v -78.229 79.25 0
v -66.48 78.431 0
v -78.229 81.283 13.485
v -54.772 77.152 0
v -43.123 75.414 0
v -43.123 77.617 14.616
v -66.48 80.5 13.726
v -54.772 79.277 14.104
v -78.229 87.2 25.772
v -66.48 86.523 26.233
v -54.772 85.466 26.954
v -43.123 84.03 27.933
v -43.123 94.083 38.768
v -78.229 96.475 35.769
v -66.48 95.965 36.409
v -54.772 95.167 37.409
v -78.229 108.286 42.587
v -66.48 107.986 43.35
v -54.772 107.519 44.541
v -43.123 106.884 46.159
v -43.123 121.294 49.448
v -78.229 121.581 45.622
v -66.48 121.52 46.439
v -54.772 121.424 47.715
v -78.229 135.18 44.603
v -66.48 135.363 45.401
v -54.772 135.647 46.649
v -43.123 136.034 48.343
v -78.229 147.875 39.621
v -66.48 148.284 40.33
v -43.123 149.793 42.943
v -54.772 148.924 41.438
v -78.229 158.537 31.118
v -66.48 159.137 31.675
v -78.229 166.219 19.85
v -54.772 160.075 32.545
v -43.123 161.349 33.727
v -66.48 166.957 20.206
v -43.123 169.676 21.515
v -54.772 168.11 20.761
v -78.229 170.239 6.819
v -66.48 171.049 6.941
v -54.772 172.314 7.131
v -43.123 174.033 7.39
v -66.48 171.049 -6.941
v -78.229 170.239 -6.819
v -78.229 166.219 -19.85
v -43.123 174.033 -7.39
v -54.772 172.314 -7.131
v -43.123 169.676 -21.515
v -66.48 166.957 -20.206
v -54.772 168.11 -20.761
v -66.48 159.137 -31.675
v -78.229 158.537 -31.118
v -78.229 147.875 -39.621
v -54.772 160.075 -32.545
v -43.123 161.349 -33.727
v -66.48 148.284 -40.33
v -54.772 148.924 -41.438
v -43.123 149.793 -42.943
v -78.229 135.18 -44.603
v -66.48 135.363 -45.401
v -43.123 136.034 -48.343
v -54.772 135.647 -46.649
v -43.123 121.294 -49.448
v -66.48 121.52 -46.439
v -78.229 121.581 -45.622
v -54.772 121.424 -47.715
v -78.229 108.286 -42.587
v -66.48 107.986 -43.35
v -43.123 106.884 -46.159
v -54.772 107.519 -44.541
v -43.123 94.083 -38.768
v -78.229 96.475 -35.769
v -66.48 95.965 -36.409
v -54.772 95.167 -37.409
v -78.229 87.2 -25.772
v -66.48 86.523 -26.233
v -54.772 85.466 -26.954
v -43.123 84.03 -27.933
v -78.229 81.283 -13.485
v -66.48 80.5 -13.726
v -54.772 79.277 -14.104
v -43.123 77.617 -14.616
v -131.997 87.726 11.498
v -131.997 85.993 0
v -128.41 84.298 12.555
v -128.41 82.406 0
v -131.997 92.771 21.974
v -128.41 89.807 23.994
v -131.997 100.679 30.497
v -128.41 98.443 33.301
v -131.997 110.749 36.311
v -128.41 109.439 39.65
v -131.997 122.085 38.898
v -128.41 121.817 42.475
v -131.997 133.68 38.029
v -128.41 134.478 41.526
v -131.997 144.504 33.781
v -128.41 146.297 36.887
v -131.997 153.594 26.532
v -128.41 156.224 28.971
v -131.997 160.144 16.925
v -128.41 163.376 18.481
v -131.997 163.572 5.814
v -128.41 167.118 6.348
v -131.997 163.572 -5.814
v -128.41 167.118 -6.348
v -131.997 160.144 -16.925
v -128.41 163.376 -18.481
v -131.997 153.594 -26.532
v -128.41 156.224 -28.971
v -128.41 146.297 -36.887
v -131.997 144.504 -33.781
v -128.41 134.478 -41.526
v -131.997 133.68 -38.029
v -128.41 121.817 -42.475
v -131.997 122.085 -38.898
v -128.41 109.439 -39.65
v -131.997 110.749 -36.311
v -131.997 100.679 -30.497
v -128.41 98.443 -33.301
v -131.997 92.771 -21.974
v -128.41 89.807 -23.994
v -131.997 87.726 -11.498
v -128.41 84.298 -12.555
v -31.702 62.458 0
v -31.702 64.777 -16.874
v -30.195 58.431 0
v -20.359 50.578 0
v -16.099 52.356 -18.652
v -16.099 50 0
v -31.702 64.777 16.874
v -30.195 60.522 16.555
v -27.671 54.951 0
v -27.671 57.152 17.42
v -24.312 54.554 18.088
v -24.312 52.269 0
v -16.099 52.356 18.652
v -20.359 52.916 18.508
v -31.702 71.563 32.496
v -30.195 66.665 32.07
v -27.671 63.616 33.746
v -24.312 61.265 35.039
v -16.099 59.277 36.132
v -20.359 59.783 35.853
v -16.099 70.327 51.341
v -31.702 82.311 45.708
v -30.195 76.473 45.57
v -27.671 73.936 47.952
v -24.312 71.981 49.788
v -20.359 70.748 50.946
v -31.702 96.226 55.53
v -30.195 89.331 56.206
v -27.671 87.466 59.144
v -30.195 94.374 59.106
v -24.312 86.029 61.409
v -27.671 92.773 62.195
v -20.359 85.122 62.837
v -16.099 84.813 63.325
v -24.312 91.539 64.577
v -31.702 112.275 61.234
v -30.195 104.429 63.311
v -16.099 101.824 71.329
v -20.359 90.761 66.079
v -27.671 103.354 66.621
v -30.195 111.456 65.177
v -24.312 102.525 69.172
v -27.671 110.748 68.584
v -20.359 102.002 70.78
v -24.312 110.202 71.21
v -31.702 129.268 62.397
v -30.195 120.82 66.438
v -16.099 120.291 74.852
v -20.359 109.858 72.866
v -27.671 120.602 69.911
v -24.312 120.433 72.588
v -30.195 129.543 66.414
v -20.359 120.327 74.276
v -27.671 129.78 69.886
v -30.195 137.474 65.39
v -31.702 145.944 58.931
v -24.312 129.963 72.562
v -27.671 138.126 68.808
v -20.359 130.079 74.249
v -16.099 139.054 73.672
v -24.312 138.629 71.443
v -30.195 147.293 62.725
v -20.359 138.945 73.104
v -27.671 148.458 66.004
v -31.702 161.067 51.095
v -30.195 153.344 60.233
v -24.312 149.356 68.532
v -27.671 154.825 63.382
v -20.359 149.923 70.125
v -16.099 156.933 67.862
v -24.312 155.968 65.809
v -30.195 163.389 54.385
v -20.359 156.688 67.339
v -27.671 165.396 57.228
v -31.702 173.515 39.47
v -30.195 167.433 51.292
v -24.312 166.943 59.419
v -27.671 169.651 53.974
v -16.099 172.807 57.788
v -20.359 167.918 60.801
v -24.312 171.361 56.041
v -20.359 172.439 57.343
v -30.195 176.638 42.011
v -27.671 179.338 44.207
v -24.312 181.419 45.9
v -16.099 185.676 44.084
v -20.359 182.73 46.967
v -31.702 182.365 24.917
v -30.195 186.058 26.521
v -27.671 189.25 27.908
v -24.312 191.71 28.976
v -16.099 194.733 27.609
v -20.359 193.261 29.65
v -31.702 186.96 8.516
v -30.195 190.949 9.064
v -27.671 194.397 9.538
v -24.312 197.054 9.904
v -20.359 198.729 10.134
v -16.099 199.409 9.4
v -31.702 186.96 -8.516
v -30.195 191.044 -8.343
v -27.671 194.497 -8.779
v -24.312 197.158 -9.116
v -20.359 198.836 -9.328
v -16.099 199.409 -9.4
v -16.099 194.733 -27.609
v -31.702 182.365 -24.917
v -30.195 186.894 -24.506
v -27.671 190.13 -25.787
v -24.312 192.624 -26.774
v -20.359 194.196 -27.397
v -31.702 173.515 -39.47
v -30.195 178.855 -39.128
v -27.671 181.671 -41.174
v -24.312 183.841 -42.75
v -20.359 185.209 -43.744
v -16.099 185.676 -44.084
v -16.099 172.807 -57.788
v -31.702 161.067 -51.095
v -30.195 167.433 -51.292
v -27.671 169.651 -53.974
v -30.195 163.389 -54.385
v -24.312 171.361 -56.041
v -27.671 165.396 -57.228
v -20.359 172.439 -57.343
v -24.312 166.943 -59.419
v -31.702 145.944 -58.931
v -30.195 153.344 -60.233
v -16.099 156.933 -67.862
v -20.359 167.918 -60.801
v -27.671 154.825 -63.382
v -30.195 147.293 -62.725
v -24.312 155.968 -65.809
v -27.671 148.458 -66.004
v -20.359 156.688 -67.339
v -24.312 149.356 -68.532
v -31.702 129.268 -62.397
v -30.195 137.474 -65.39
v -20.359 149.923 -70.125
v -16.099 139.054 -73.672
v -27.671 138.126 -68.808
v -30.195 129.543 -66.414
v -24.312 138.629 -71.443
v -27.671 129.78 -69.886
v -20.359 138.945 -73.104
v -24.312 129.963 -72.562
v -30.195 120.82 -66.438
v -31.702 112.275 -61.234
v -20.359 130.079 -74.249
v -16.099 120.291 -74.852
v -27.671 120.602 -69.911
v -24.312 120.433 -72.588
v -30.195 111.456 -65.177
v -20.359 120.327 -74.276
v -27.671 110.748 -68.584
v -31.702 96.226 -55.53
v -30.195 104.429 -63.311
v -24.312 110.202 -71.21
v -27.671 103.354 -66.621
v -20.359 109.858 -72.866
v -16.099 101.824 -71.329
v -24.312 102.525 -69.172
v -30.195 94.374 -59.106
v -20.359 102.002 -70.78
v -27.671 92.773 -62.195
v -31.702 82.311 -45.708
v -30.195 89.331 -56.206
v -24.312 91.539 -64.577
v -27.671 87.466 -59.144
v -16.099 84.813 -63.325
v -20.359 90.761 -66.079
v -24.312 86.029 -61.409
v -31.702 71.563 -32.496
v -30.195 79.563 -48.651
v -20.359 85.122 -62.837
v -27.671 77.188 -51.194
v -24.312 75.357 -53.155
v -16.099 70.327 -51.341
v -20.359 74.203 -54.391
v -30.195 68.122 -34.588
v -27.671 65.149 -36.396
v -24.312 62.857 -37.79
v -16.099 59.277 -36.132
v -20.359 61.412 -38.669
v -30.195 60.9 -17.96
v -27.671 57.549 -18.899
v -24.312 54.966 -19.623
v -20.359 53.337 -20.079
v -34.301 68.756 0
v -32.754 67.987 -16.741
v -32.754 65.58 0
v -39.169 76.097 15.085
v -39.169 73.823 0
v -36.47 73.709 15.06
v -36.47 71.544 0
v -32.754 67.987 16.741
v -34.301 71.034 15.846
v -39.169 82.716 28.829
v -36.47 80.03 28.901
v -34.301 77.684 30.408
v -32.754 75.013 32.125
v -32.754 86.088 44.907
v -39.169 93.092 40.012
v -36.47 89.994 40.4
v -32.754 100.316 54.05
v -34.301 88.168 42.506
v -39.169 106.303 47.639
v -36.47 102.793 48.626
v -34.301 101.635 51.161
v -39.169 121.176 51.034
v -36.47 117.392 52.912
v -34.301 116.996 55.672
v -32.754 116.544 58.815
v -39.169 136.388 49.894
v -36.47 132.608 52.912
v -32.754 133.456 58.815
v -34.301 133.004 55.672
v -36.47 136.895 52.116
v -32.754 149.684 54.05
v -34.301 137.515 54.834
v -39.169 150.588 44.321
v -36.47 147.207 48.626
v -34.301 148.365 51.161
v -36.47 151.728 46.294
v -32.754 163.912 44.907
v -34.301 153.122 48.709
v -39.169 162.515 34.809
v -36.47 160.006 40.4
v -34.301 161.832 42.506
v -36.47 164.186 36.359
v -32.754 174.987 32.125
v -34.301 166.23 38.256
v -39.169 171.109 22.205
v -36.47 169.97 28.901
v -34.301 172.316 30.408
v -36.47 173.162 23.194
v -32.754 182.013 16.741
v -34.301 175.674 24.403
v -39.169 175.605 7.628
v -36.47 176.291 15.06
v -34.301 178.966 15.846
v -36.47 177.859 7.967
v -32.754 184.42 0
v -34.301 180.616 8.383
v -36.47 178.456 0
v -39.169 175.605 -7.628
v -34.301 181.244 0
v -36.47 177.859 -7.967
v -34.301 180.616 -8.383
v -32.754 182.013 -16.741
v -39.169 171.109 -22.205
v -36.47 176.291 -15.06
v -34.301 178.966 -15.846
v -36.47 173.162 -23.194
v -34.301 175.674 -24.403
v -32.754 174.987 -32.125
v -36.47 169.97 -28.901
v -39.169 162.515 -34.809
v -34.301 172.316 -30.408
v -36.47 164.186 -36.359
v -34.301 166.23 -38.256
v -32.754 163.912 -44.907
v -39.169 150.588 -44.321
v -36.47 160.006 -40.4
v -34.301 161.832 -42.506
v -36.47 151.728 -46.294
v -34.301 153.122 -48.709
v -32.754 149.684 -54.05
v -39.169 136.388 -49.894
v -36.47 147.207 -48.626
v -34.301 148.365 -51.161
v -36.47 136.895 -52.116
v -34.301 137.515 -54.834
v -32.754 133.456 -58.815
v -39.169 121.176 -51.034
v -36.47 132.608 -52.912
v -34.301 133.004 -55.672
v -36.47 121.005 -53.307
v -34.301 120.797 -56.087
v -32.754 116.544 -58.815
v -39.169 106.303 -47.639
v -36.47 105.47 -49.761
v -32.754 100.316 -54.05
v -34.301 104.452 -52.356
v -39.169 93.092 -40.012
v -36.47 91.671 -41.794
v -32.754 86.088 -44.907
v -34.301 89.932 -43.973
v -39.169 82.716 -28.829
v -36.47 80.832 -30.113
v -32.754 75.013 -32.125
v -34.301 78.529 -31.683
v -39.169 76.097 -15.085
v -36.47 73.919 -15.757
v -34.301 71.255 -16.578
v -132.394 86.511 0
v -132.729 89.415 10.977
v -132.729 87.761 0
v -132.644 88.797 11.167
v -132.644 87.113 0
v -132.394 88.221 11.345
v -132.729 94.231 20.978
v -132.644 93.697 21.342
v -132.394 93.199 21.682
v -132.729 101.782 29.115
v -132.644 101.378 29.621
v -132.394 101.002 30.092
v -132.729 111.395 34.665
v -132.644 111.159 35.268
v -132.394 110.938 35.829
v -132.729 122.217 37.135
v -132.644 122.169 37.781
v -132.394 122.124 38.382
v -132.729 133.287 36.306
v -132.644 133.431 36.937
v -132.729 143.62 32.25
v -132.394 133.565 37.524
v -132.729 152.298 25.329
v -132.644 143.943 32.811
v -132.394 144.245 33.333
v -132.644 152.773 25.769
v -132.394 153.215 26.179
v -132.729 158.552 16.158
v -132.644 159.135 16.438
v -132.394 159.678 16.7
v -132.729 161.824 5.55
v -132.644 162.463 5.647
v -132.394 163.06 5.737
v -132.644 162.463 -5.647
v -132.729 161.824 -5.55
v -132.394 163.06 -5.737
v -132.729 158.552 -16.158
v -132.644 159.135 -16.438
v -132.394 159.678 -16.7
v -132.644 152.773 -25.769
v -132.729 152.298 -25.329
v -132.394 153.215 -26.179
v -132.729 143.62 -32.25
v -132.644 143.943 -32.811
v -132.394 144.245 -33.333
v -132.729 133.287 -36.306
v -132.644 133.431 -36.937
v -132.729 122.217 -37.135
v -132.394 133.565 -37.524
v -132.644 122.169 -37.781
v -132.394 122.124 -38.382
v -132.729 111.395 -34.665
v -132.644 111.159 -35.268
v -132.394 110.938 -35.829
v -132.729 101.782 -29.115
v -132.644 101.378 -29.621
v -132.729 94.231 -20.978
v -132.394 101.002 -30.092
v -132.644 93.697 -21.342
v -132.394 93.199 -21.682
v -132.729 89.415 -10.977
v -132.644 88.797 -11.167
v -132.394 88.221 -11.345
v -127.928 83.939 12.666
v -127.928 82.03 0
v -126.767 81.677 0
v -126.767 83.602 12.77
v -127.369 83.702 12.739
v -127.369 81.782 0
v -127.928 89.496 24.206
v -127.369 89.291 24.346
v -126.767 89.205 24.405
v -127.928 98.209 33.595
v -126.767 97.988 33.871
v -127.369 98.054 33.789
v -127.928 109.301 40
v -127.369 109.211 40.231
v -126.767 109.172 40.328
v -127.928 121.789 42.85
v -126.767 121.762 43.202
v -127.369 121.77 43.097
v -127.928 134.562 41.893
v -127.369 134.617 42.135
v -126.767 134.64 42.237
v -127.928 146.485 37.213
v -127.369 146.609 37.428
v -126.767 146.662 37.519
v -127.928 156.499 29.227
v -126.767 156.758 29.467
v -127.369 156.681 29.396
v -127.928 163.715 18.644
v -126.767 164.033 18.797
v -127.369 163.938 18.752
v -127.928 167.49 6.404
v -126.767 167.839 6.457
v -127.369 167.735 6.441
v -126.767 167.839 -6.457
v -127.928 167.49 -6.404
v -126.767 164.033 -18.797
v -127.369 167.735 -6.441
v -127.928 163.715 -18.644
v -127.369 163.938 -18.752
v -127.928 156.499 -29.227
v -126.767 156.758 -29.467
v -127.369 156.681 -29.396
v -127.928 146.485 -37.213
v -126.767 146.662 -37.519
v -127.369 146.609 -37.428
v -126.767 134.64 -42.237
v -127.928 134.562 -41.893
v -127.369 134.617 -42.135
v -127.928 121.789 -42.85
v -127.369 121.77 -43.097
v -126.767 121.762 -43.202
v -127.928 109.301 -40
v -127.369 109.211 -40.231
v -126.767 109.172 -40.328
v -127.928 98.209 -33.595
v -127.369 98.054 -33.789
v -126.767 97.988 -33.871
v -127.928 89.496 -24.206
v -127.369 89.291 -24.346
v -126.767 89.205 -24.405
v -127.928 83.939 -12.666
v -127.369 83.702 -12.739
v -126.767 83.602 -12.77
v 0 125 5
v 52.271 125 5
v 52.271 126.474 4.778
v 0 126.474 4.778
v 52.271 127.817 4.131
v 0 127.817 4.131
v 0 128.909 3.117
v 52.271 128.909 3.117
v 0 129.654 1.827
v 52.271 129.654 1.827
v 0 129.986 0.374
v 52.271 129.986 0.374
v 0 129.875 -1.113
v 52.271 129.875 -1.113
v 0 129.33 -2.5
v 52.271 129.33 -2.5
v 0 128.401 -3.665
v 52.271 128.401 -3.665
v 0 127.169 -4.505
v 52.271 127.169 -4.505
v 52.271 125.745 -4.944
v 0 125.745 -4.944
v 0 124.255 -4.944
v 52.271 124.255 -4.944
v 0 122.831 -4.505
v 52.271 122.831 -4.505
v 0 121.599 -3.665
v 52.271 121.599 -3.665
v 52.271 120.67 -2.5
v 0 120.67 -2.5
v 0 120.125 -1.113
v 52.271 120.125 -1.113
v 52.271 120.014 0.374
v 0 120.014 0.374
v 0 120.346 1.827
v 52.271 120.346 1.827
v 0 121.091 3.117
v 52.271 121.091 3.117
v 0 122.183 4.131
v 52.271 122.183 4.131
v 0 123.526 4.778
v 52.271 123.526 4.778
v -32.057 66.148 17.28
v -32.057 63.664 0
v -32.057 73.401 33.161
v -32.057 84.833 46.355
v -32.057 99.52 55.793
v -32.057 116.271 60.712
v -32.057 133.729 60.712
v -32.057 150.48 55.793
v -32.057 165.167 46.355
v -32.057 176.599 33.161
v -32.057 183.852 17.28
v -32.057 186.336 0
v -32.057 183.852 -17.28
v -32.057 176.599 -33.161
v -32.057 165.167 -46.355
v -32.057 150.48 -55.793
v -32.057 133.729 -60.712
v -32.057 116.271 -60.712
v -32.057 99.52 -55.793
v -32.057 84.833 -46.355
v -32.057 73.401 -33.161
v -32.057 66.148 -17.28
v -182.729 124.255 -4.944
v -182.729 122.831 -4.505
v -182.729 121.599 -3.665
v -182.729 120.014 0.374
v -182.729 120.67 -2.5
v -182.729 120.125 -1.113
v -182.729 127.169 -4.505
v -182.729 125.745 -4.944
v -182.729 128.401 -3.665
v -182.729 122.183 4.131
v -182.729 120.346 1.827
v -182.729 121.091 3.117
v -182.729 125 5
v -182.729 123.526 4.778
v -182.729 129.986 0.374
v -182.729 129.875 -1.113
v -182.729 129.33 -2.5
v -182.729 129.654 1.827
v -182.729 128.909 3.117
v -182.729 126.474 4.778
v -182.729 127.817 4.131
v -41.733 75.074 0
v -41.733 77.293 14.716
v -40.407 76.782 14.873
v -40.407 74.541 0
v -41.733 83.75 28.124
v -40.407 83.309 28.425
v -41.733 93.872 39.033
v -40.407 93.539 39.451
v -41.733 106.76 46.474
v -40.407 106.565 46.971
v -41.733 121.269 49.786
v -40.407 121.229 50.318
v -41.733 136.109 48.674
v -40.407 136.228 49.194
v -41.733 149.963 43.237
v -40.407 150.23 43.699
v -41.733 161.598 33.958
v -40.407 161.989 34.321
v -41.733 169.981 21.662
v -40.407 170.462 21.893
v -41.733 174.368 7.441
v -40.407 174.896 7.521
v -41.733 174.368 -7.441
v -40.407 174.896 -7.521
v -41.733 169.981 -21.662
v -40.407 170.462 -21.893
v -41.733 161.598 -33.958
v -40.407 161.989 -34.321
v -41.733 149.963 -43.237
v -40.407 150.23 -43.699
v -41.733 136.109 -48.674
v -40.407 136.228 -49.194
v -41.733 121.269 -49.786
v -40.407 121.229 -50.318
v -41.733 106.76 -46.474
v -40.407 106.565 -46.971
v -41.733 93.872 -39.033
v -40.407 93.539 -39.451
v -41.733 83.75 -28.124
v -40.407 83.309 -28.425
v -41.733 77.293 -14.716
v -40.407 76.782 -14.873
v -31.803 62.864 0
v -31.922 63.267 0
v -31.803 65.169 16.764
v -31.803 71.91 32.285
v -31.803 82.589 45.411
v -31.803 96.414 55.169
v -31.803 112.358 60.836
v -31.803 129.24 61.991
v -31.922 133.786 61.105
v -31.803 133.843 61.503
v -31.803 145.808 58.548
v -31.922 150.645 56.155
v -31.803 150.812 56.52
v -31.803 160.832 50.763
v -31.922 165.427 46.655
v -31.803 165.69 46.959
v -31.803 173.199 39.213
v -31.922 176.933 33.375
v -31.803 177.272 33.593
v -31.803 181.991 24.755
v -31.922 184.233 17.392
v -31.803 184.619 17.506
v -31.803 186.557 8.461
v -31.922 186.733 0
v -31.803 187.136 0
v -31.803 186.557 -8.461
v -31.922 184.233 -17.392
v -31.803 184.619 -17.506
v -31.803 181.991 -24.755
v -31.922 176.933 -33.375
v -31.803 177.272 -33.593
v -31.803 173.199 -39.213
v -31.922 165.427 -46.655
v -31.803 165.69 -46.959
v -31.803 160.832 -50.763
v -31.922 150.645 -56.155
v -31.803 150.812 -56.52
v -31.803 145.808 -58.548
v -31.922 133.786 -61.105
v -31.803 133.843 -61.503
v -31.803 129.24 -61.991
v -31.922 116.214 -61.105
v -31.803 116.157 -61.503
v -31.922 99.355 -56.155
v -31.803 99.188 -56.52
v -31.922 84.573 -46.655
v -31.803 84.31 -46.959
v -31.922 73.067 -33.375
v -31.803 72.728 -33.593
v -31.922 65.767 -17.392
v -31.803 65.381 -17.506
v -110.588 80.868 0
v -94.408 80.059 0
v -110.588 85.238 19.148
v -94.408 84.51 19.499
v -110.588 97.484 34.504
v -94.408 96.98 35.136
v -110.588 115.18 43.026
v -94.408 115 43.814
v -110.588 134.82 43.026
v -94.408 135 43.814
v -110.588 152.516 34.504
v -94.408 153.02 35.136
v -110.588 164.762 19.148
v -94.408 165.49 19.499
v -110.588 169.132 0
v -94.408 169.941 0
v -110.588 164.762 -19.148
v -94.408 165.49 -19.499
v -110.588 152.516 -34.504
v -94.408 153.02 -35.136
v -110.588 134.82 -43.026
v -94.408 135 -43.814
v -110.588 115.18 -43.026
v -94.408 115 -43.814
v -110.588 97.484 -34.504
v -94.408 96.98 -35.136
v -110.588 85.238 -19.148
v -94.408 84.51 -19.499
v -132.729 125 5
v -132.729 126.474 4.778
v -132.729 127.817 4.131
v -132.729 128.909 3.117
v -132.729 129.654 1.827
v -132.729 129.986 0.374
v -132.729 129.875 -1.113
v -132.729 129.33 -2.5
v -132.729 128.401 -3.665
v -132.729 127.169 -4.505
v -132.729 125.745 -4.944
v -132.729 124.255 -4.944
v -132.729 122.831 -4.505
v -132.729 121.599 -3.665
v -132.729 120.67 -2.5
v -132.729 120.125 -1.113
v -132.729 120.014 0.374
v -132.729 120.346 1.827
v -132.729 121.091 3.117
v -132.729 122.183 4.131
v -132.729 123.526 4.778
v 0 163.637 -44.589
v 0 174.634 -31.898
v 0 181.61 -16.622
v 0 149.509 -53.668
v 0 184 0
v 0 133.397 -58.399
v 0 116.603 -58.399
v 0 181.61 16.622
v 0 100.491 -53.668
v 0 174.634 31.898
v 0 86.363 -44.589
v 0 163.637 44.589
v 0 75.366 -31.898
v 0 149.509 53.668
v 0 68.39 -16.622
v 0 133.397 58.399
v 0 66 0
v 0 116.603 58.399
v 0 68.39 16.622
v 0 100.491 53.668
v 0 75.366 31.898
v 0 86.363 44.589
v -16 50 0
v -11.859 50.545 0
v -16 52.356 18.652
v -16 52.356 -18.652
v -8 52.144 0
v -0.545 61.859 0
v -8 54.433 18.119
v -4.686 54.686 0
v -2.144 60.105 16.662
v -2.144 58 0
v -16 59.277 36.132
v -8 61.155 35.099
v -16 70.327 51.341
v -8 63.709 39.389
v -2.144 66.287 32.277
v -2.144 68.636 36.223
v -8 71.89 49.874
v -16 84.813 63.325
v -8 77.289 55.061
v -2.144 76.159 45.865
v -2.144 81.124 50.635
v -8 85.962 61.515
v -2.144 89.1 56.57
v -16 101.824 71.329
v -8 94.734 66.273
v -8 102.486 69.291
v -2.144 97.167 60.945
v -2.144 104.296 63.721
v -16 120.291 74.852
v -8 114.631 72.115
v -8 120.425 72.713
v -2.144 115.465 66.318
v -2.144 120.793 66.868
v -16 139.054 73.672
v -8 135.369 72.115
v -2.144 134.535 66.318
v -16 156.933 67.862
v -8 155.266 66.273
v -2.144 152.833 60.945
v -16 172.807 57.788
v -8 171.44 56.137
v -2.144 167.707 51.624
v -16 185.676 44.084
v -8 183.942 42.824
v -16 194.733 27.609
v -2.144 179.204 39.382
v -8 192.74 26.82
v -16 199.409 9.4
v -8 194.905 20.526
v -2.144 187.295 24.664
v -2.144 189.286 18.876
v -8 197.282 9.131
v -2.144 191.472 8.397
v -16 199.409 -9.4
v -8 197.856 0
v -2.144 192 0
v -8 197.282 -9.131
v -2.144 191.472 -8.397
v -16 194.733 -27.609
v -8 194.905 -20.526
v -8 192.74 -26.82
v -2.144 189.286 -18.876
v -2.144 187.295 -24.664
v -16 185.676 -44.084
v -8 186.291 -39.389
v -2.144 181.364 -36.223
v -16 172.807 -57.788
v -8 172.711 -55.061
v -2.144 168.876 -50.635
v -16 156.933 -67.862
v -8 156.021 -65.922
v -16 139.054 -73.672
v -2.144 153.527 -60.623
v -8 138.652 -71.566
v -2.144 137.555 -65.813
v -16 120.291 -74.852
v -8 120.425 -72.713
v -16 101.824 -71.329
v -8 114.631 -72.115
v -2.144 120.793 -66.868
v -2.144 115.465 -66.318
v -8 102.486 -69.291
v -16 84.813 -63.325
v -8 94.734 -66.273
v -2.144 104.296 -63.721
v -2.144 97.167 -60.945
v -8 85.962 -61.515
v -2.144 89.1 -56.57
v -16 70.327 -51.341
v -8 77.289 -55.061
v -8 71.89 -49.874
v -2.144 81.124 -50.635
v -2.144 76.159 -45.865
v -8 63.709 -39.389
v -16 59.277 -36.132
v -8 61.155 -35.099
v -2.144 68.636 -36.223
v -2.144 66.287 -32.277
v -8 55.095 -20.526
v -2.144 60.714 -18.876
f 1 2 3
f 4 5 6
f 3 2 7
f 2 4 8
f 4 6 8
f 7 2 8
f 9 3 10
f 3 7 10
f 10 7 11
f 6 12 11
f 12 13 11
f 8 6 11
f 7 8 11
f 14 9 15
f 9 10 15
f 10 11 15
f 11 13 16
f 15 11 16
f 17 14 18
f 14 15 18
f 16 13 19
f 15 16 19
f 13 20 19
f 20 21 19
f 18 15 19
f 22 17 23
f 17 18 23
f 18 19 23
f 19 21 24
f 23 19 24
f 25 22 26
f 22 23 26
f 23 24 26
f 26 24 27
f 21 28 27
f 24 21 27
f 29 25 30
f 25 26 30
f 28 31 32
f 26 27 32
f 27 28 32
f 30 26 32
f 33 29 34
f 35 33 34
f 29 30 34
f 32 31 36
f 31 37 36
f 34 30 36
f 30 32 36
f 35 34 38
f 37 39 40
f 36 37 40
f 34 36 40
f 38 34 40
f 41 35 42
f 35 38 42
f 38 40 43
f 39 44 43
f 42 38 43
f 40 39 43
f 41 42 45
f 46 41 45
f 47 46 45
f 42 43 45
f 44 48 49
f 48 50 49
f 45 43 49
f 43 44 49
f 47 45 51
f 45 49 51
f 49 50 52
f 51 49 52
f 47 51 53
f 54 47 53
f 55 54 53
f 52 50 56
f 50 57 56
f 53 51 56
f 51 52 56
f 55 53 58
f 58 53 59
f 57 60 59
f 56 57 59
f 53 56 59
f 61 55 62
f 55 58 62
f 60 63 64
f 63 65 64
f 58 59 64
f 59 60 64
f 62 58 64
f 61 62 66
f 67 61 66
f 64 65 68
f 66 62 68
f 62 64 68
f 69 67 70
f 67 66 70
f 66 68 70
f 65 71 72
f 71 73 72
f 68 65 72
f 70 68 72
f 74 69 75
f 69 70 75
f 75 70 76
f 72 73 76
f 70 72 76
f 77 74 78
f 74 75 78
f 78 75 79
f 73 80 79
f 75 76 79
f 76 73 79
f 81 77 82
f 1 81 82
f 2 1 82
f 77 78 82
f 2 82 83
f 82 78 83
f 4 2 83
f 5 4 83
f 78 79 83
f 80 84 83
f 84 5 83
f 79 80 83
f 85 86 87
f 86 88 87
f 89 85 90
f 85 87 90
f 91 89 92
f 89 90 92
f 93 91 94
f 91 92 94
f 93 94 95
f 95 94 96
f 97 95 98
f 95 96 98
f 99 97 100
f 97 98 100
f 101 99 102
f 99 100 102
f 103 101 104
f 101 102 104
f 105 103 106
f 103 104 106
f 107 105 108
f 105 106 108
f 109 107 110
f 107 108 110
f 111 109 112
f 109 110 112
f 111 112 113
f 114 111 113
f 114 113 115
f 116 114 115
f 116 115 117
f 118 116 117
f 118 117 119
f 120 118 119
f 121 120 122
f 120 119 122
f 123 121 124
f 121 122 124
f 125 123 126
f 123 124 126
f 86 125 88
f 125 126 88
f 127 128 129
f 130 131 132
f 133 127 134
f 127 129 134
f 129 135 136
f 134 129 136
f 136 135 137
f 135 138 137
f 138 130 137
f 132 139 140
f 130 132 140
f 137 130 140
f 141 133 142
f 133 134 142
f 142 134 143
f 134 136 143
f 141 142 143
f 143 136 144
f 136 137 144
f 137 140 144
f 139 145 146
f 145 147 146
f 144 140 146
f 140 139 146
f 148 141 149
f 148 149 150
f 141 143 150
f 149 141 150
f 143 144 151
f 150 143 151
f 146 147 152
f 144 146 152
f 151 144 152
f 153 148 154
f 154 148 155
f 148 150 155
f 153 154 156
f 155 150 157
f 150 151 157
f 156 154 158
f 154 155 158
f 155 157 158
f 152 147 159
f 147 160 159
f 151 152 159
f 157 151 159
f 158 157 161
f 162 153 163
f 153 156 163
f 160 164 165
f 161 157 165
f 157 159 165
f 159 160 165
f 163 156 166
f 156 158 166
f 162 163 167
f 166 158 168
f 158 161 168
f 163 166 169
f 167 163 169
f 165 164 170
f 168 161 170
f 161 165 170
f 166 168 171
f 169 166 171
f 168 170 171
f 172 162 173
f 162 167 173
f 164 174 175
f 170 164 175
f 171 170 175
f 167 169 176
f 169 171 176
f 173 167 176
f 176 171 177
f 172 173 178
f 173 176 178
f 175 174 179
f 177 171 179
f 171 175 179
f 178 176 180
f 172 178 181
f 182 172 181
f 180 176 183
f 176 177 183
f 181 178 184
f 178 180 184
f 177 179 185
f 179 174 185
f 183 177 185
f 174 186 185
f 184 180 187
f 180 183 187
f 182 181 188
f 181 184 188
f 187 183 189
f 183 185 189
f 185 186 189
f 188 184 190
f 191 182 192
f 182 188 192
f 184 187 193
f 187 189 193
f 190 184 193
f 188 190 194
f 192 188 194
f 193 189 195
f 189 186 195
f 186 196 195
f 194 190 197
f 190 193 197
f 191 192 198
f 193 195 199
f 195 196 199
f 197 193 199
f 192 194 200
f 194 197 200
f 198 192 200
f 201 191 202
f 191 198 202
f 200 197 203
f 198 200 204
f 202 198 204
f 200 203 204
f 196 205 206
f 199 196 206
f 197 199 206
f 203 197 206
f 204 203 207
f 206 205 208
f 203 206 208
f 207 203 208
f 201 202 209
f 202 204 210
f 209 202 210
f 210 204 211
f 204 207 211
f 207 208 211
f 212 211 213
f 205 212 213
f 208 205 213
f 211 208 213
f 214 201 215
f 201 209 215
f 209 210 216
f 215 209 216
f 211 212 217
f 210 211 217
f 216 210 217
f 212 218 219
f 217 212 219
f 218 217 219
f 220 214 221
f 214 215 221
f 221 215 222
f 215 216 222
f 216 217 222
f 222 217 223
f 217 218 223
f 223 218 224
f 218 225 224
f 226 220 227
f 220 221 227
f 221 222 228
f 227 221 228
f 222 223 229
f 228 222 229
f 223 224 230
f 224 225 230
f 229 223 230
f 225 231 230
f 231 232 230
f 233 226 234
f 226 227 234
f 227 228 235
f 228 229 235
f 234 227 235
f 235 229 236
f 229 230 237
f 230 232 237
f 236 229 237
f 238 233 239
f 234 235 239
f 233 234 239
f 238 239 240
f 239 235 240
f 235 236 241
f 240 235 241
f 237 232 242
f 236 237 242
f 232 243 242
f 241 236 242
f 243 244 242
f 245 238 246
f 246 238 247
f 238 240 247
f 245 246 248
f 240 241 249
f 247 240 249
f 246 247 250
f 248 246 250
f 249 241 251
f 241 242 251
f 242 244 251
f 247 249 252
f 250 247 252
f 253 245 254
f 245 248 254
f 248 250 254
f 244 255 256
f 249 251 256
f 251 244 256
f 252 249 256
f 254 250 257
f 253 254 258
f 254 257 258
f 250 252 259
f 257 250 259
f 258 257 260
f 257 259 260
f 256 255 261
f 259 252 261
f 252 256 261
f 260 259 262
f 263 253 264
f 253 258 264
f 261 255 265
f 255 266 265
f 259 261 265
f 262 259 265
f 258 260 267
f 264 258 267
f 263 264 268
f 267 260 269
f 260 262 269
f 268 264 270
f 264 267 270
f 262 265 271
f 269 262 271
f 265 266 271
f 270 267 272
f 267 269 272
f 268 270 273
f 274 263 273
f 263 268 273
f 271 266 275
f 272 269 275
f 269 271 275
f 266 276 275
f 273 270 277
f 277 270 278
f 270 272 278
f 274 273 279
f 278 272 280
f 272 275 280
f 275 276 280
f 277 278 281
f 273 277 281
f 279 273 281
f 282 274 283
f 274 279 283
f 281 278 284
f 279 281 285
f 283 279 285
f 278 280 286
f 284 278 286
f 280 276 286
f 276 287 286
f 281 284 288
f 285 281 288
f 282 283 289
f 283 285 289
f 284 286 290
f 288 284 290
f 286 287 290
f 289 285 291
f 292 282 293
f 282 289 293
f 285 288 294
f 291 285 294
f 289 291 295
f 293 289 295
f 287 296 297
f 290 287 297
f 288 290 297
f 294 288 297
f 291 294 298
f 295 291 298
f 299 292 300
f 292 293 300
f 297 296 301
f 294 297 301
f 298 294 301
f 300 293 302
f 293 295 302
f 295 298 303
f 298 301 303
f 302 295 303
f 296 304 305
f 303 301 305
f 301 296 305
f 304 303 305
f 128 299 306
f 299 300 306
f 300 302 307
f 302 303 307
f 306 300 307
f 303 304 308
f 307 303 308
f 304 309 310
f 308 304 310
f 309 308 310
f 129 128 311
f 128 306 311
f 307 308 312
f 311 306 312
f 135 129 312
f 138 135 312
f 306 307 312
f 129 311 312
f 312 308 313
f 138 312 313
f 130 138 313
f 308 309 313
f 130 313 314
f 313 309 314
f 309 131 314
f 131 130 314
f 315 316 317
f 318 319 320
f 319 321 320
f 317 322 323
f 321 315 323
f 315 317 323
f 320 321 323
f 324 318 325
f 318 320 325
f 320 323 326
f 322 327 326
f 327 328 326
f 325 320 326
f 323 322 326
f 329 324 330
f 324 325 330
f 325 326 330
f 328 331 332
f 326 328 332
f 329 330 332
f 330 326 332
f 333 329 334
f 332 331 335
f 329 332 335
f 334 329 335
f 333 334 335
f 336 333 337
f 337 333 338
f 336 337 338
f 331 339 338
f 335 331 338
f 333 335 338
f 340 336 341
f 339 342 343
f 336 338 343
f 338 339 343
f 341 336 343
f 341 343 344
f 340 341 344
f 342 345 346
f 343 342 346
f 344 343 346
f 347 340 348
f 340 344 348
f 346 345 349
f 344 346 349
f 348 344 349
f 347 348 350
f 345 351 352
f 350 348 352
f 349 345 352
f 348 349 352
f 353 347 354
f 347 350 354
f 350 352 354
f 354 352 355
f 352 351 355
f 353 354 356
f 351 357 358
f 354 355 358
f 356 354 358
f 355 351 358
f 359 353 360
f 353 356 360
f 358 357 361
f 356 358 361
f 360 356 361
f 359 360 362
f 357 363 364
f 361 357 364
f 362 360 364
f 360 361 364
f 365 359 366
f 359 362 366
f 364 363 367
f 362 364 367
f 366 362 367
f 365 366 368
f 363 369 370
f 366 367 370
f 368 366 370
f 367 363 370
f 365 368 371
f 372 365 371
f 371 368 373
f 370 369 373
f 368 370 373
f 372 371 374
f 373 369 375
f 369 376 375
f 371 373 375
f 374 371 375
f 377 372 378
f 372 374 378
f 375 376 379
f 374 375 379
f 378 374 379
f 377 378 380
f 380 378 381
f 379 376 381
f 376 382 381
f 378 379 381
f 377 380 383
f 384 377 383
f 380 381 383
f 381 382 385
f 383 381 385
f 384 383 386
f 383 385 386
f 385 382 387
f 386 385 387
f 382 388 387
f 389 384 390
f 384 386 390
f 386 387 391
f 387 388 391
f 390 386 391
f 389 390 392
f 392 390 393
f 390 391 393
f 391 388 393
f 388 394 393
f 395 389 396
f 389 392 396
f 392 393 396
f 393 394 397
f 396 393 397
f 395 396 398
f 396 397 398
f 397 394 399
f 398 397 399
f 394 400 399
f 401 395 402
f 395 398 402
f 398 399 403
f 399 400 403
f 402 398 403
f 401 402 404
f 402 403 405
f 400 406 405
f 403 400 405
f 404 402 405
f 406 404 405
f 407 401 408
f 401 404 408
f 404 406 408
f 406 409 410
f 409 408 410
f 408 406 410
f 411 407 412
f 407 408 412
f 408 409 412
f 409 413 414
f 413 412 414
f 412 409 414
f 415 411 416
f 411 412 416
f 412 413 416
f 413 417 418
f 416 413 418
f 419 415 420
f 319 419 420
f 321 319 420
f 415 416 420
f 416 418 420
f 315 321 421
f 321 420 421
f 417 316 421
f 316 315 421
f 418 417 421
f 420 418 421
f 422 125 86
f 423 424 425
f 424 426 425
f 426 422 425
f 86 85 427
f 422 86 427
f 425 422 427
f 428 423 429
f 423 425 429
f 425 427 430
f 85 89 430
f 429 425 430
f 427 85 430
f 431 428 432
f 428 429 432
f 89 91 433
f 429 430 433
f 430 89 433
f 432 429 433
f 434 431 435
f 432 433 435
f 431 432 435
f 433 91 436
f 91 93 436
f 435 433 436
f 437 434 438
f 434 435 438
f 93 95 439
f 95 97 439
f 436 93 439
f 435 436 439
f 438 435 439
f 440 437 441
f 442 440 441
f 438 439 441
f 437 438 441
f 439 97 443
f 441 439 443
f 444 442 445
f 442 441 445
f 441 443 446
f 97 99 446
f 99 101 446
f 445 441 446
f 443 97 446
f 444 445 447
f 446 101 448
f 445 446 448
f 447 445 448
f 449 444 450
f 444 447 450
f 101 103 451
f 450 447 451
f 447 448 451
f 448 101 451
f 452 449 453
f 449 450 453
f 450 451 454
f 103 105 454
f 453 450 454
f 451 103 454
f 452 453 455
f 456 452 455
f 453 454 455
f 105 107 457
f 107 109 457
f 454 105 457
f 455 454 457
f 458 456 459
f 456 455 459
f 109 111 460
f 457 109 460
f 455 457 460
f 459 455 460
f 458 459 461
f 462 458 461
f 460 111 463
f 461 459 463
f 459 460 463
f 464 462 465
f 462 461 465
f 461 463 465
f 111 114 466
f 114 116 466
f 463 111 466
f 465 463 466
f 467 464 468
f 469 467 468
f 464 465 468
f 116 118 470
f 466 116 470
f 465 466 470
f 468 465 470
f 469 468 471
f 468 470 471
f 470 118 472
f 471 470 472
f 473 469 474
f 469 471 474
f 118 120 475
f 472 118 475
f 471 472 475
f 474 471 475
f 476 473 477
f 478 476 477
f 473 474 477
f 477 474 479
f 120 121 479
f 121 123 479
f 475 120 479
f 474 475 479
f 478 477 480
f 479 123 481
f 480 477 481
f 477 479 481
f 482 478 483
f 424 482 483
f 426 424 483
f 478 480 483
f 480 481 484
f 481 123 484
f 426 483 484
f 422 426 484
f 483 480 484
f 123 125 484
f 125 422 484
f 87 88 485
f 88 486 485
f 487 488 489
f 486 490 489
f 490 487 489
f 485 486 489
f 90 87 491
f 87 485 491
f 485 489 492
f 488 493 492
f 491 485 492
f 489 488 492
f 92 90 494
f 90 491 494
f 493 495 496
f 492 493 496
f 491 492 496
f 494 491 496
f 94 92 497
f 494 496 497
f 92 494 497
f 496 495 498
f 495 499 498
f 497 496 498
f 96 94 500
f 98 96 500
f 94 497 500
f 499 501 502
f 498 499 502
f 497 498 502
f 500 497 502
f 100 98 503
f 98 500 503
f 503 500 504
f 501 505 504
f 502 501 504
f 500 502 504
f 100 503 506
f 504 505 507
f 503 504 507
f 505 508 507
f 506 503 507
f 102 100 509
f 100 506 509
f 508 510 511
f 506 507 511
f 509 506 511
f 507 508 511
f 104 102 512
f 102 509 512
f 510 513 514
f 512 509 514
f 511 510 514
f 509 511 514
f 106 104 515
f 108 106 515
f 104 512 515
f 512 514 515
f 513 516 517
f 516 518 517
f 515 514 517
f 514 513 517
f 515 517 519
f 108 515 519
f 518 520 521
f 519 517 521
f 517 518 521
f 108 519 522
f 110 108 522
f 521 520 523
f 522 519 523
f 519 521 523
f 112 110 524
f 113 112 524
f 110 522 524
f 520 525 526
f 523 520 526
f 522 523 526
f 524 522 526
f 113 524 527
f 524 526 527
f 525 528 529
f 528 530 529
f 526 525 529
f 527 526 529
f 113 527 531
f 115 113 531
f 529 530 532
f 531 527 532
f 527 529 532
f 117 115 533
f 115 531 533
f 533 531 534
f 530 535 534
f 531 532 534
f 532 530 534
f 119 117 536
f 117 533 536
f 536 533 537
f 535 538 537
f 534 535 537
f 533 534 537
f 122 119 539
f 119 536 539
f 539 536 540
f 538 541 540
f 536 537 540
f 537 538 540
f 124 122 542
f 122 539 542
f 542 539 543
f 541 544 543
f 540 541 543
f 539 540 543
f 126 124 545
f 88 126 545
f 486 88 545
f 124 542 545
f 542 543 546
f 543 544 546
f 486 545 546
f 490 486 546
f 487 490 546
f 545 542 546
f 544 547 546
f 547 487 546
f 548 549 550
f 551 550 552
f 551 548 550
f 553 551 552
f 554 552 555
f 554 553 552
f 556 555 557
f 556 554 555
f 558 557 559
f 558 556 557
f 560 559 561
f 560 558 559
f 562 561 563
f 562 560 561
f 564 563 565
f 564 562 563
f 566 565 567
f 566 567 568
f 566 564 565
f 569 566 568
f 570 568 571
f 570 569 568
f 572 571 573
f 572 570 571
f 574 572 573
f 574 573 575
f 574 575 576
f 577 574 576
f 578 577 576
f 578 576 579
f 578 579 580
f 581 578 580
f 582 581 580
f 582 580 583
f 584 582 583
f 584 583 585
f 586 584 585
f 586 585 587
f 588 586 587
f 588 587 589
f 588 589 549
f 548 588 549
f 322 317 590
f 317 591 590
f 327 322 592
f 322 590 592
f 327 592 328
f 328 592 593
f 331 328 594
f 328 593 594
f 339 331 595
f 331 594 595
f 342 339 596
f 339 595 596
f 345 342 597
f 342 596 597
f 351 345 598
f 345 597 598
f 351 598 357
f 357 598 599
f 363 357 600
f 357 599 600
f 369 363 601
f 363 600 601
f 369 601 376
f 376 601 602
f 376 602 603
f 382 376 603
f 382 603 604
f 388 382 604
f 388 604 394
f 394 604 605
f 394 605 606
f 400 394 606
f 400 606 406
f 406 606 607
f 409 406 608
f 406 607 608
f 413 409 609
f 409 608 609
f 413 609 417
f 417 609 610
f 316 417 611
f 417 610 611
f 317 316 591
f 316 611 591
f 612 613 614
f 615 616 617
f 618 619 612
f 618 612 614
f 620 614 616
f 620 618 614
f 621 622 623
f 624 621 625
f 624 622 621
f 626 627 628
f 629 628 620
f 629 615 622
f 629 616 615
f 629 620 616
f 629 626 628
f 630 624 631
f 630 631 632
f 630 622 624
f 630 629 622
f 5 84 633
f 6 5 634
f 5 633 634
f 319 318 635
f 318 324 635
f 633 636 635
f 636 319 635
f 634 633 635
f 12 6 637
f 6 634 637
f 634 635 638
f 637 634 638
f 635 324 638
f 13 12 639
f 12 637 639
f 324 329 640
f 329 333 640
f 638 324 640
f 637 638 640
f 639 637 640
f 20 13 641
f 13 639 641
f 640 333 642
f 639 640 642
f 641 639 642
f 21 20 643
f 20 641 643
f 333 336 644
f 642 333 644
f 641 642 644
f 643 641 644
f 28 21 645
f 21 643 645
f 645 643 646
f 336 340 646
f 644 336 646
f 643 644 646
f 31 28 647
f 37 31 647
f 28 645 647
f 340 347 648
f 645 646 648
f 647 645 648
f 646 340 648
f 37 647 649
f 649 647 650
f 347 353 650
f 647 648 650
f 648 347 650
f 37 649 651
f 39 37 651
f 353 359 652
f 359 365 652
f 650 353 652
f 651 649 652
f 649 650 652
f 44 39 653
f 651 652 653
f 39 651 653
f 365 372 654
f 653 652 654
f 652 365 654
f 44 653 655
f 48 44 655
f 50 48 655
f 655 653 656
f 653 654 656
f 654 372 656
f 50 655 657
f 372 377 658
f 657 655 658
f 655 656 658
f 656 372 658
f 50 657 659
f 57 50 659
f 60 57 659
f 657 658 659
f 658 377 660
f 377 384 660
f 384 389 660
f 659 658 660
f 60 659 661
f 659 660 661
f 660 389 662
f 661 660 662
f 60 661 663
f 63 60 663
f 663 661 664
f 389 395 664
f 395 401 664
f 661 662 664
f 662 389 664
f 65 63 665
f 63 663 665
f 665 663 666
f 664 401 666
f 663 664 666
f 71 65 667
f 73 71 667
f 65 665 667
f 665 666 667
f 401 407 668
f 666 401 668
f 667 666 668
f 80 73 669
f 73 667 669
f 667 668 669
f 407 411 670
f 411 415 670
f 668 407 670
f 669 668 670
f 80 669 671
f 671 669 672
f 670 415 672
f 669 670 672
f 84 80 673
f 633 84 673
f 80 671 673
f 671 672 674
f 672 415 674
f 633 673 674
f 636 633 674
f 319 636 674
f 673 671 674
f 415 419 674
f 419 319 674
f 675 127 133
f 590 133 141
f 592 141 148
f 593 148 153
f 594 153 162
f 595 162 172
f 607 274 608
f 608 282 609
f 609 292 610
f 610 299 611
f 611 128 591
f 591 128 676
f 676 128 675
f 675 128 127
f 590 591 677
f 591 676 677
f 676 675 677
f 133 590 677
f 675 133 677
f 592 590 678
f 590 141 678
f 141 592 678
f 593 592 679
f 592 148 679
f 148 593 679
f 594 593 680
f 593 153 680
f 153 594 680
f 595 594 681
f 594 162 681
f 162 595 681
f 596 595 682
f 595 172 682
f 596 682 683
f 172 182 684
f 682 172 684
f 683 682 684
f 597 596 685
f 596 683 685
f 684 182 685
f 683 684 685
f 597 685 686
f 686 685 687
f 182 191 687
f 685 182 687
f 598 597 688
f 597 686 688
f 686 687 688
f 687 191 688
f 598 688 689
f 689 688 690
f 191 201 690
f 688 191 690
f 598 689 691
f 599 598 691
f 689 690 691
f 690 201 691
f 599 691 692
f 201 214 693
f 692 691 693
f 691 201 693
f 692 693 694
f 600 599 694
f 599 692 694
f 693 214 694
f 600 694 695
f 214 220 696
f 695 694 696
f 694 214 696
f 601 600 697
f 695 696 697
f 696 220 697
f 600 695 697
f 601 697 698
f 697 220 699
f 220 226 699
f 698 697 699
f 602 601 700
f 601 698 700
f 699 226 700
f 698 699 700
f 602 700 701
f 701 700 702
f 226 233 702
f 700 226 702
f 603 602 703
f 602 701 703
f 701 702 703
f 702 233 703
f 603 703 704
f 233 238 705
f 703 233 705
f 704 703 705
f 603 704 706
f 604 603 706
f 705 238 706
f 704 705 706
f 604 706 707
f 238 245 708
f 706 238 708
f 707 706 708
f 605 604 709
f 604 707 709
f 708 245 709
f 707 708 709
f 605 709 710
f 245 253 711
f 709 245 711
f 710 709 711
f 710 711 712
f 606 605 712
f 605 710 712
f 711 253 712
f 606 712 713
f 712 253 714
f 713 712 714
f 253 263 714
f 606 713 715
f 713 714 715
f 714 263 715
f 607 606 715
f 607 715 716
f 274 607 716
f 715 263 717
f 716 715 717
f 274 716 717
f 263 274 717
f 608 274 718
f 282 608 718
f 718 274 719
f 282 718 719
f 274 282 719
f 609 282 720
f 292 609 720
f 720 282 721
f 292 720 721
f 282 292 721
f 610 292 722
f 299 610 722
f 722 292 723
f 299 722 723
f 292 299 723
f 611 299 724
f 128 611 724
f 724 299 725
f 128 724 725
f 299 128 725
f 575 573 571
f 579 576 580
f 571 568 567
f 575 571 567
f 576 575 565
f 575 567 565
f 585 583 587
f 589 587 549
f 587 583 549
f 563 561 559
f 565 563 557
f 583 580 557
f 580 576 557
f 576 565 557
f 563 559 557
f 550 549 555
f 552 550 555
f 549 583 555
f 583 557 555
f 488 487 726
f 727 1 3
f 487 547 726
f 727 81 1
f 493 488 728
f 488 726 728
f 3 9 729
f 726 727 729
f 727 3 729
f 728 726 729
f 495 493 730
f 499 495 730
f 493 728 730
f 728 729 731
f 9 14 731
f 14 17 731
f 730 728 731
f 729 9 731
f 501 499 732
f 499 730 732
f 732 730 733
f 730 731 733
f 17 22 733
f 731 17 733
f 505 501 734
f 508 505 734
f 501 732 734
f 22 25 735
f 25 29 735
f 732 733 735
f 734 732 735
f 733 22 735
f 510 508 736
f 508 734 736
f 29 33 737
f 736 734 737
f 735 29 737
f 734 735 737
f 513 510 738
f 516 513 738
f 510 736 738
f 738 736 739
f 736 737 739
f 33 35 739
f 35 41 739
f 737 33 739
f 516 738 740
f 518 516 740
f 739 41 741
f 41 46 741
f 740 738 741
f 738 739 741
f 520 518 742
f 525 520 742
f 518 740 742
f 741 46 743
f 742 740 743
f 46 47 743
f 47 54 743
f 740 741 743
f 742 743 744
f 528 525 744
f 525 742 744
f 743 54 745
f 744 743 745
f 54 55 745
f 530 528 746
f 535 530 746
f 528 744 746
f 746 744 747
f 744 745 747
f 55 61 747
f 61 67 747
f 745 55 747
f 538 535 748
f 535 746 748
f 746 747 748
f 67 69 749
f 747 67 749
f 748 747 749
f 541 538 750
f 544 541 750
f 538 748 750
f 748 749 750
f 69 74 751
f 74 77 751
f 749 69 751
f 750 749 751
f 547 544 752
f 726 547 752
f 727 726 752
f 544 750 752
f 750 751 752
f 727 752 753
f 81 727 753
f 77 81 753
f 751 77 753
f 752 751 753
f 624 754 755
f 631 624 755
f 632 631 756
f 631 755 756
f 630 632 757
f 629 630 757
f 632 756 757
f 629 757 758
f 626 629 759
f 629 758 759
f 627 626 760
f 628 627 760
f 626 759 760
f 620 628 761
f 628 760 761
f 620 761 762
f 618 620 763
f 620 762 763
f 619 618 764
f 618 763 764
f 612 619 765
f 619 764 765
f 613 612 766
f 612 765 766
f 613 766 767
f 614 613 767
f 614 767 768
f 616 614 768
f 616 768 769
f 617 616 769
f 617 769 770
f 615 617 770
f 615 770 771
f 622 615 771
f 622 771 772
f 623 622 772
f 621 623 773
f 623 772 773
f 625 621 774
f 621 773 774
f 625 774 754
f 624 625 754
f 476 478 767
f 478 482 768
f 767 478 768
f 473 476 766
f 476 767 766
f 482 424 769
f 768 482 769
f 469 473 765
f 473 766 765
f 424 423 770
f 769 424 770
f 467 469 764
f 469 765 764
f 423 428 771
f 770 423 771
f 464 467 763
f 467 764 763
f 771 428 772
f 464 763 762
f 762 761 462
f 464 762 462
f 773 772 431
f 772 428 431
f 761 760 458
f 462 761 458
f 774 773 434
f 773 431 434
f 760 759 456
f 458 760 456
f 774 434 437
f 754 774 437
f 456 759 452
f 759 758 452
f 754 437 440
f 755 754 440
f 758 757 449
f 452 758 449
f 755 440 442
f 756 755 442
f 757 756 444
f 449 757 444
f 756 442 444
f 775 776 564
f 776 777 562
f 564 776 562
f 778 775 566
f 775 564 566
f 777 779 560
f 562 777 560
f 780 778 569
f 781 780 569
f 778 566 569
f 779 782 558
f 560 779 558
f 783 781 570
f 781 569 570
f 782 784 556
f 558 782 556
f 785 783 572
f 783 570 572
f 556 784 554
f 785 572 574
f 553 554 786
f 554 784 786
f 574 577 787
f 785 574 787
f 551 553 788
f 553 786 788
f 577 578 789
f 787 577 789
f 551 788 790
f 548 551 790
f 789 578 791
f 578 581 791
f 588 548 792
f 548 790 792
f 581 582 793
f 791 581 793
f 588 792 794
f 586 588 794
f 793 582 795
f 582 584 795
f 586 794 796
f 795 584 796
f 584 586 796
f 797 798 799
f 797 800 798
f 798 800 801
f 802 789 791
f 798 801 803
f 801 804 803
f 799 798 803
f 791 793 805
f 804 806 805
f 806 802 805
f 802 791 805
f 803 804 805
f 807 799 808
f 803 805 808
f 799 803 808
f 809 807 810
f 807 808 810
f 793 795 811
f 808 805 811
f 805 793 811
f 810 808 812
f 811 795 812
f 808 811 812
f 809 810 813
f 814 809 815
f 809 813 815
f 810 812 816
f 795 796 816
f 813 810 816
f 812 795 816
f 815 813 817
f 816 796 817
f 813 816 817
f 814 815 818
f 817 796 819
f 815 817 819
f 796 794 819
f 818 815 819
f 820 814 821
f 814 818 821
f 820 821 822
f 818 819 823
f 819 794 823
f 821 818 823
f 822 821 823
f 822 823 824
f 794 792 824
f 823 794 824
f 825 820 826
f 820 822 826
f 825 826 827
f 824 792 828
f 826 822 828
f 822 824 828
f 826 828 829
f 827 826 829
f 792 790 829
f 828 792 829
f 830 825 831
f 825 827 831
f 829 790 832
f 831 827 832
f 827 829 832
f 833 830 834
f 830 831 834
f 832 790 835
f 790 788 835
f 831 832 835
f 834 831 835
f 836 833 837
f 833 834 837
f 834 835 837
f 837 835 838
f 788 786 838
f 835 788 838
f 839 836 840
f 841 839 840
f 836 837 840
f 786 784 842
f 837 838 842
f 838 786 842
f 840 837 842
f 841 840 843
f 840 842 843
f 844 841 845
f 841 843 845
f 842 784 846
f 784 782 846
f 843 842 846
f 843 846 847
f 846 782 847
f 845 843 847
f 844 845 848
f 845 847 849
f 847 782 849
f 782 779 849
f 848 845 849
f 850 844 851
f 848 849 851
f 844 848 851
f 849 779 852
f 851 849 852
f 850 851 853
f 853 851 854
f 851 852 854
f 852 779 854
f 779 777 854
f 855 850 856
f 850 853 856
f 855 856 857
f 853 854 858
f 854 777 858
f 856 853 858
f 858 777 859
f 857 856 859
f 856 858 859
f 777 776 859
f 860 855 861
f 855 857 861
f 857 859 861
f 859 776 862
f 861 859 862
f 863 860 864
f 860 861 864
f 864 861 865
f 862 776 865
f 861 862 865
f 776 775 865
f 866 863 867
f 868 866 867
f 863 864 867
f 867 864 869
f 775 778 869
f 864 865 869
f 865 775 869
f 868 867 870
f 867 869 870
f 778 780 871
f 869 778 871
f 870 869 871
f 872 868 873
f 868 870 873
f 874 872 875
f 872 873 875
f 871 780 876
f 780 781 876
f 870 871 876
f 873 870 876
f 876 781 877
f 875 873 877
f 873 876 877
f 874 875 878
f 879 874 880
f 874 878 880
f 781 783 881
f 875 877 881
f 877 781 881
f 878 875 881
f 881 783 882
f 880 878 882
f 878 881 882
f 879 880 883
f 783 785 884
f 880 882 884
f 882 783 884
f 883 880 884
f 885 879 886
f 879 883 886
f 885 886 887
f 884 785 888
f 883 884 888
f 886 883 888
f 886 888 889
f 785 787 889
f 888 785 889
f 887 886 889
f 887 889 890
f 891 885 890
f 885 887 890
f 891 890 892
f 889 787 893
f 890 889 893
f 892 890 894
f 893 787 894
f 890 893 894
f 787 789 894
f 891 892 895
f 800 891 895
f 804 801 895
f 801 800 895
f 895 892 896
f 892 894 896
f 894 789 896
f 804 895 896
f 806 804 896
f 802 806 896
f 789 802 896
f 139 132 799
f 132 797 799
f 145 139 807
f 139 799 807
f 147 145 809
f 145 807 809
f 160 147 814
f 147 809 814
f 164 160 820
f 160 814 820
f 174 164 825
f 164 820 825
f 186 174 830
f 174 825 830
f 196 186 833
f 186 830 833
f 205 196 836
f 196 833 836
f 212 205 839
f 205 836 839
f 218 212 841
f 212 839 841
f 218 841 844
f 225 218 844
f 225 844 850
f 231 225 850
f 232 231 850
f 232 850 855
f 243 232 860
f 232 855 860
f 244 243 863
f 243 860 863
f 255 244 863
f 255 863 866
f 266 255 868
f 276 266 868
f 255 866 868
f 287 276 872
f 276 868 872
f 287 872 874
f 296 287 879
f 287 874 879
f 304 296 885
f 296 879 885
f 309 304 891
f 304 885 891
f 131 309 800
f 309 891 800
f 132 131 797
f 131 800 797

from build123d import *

# Parameters (mm, degrees)
SKETCH3_R                = 5
BOSS_EXTRUDE1_DEPTH      = 50
BOSS_EXTRUDE1_DEPTH_BACK = 185


with BuildPart() as part:
    # Sketch2 → Revolve1 (revolve)
    with BuildSketch(Plane.XY):
        with BuildLine():
            Line((-126.767029403, 81.676904789), (-78.228933631, 79.25))
            ThreePointArc((-78.228933631, 79.25), (-60.619483805, 77.84878425), (-43.123035518, 75.413537626))
            ThreePointArc((-43.123035518, 75.413537626), (-41.060447751, 74.831340884), (-39.169286378, 73.823010577))
            ThreePointArc((-39.169286378, 73.823010577), (-35.312933401, 70.206346657), (-32.754159078, 65.579858771))
            Line((-32.754159078, 65.579858771), (-32.056761325, 63.663774193))
            ThreePointArc((-32.056761325, 63.663774193), (-31.860334358, 63.066262055), (-31.701859109, 62.457583237))
            ThreePointArc((-31.701859109, 62.457583237), (-26.081952508, 53.496427146), (-16.098933631, 50))
            Line((-16.098933631, 50), (-16, 50))
            ThreePointArc((-16, 50), (-4.686291501, 54.686291501), (0, 66))
            Line((0, 66), (0, 78.5))
            Line((0, 78.5), (0, 125))
            Line((0, 125), (-132.728933631, 125))
            Line((-132.728933631, 125), (-132.728933631, 97.760533906))
            Line((-132.728933631, 97.760533906), (-132.728933631, 87.760533906))
            ThreePointArc((-132.728933631, 87.760533906), (-132.538632462, 86.803825325), (-131.996700584, 85.992766953))
            Line((-131.996700584, 85.992766953), (-128.409952314, 82.406018683))
            ThreePointArc((-128.409952314, 82.406018683), (-127.656283908, 81.888702675), (-126.767029403, 81.676904789))
        make_face()
    revolve(axis=Axis((0, 125, 0), (-1, 0, 0)))

    # Sketch3 → Boss-Extrude1 (add, two sides)
    with BuildSketch(Plane.ZY.offset(132.728933631)) as boss_extrude1_sk:
        with Locations((0, 125)):
            Circle(SKETCH3_R)
    extrude(amount=BOSS_EXTRUDE1_DEPTH)
    extrude(boss_extrude1_sk.sketch, amount=-BOSS_EXTRUDE1_DEPTH_BACK)


solid = part.part
